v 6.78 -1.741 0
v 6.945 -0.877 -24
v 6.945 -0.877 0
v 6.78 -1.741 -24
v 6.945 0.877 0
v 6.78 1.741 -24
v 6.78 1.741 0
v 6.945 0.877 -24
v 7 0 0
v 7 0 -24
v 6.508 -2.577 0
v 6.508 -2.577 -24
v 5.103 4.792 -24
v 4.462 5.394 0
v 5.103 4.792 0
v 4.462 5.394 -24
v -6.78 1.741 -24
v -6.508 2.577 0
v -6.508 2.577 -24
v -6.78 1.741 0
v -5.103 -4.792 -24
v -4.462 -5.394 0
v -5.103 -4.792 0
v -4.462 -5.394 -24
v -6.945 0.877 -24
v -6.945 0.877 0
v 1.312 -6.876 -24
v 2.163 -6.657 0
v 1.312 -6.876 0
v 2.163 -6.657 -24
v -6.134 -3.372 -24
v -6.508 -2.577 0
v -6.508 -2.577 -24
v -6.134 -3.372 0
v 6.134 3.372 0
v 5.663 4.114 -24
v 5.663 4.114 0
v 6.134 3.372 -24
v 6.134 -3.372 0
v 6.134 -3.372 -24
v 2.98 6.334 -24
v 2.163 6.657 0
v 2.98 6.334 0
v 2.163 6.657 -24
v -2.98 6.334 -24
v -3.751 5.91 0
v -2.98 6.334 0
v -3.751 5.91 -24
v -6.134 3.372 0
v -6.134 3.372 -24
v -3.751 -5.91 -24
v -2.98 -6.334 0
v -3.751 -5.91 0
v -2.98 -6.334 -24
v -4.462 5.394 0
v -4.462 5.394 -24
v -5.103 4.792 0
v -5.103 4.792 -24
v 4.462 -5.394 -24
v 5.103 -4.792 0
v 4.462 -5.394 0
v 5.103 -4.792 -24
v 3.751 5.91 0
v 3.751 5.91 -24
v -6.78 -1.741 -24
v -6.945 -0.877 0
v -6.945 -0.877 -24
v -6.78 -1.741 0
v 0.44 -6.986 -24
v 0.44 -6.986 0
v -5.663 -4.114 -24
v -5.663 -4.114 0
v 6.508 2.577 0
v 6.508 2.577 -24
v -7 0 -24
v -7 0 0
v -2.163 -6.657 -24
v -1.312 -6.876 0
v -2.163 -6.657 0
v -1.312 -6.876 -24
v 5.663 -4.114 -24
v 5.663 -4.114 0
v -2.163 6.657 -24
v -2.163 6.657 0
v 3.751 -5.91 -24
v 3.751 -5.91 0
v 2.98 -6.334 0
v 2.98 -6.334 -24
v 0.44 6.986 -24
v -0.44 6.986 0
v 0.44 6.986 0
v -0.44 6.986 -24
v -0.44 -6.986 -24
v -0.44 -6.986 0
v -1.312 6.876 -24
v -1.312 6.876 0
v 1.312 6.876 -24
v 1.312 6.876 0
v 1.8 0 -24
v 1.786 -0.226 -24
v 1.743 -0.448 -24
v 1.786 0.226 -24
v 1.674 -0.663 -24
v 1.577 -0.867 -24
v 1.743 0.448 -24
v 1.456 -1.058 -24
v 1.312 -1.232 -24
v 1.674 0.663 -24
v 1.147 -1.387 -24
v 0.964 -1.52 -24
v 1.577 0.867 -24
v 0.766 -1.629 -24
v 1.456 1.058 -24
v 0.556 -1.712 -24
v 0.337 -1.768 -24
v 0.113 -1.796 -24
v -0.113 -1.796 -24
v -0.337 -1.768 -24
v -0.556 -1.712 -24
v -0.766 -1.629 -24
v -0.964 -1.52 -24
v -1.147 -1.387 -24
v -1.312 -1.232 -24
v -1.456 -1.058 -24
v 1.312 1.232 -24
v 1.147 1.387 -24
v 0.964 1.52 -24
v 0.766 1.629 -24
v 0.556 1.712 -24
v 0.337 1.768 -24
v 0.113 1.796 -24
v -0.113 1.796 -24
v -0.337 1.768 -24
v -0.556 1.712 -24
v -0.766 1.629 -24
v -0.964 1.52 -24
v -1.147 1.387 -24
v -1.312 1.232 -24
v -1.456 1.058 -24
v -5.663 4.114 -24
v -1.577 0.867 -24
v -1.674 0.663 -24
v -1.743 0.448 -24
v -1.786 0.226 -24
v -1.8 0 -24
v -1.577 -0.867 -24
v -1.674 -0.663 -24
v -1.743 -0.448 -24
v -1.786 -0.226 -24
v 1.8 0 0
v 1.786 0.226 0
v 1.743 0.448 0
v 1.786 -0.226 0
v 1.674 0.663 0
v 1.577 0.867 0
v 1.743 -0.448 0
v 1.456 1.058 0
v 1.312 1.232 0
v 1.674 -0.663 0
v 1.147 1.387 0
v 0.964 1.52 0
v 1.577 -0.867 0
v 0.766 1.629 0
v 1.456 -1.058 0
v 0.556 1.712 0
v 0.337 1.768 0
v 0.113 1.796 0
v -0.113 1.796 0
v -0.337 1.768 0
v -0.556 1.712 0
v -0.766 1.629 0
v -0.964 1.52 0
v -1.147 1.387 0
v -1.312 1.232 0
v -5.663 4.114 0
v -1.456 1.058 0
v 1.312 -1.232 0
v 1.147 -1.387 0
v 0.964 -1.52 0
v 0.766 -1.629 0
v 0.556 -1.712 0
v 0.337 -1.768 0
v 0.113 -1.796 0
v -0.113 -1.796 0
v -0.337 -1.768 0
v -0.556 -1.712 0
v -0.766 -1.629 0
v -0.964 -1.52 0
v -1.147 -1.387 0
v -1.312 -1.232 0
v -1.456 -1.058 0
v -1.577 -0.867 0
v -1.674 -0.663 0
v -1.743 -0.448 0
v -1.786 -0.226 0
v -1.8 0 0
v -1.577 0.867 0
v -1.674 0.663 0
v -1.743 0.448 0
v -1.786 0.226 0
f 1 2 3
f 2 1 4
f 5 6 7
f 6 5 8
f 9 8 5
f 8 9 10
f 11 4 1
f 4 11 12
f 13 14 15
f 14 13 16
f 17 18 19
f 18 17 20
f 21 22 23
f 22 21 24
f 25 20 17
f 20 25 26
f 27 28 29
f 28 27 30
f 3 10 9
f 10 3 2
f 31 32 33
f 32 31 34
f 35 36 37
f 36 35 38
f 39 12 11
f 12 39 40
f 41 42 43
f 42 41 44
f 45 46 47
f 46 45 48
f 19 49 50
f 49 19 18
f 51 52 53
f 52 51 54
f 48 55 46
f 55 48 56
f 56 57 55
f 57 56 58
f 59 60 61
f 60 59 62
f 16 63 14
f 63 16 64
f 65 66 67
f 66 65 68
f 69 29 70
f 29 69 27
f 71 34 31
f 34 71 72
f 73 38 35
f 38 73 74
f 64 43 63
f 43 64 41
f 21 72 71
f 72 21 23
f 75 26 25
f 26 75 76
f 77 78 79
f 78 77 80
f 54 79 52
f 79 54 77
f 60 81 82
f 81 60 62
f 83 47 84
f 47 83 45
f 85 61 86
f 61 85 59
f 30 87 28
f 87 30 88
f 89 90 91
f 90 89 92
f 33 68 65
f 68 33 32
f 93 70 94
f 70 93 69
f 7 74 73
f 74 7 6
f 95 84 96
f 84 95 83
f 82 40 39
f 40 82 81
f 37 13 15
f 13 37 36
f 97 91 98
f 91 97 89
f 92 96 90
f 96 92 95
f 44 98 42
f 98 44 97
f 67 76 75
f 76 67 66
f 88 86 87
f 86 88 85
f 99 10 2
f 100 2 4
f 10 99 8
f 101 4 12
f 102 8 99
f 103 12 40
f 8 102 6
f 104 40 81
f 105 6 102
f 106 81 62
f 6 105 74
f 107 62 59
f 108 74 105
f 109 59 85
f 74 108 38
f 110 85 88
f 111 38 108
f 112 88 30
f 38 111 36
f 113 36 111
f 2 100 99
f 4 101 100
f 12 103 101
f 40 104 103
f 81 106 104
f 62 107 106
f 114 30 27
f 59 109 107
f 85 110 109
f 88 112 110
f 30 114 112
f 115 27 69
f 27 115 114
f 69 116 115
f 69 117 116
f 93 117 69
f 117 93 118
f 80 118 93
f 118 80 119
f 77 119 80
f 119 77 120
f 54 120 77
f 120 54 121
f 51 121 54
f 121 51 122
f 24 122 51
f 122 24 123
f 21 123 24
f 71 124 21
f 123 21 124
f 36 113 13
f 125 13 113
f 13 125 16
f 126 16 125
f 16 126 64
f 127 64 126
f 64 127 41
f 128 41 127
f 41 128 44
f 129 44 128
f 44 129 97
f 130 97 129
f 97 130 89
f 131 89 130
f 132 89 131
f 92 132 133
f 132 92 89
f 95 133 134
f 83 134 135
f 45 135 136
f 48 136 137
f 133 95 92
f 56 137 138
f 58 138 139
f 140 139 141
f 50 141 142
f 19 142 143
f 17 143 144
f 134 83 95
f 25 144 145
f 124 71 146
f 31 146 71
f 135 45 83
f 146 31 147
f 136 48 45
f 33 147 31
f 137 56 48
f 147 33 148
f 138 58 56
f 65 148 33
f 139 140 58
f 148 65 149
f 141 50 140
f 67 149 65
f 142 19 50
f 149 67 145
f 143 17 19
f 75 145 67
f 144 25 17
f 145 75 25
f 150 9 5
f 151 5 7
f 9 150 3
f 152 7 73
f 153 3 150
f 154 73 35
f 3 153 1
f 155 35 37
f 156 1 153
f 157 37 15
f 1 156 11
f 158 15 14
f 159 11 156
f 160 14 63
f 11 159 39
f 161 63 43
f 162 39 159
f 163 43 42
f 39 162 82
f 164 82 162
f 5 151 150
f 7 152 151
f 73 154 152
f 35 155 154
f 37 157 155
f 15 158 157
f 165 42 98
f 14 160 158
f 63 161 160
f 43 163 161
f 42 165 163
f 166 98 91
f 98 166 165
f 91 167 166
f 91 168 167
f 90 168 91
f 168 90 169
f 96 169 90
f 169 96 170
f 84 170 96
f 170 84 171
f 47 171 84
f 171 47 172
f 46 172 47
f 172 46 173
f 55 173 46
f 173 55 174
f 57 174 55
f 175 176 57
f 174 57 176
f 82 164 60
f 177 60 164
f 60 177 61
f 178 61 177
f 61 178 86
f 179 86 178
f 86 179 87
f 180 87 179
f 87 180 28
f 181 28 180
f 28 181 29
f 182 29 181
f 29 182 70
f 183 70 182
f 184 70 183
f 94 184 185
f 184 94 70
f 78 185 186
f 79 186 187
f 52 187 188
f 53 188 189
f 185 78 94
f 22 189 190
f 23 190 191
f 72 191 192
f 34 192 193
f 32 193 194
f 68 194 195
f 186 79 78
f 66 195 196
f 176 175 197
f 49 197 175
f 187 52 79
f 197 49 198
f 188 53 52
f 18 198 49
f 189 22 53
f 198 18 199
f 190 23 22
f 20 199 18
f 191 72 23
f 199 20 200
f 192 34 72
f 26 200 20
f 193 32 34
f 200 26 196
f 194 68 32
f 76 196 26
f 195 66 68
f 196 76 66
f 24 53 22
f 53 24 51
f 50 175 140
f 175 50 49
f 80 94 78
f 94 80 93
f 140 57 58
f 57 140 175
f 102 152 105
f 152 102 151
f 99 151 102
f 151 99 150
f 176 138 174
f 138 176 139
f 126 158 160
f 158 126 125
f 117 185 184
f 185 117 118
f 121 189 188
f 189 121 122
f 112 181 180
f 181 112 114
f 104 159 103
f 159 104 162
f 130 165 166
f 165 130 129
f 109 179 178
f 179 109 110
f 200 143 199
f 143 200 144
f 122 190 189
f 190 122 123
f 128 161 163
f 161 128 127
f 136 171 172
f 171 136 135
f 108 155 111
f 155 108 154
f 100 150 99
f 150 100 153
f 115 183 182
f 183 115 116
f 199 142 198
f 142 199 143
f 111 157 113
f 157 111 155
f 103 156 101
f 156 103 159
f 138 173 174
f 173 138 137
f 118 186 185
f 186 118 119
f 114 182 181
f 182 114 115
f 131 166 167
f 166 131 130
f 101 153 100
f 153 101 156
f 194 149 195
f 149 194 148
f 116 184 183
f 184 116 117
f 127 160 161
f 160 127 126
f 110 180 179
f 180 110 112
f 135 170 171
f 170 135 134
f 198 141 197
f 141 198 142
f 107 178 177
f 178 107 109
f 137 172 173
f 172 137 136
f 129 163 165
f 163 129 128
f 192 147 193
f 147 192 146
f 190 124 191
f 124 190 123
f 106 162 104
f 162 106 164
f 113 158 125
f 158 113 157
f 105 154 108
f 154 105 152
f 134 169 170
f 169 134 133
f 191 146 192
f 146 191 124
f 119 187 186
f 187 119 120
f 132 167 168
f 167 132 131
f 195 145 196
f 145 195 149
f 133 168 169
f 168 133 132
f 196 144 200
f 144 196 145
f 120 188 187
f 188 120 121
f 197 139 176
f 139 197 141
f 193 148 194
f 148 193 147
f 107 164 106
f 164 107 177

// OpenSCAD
$fn = 50;


difference() {
	union() {
		translate(v = [0, 0, -24.0000000000]) {
			cylinder(h = 24, r = 7.0000000000);
		}
		cylinder(h = 0, r = 10.0000000000);
	}
	union() {
		#translate(v = [0, 0, -24]) {
			cylinder(h = 24, r = 1.8000000000);
		}
	}
}
